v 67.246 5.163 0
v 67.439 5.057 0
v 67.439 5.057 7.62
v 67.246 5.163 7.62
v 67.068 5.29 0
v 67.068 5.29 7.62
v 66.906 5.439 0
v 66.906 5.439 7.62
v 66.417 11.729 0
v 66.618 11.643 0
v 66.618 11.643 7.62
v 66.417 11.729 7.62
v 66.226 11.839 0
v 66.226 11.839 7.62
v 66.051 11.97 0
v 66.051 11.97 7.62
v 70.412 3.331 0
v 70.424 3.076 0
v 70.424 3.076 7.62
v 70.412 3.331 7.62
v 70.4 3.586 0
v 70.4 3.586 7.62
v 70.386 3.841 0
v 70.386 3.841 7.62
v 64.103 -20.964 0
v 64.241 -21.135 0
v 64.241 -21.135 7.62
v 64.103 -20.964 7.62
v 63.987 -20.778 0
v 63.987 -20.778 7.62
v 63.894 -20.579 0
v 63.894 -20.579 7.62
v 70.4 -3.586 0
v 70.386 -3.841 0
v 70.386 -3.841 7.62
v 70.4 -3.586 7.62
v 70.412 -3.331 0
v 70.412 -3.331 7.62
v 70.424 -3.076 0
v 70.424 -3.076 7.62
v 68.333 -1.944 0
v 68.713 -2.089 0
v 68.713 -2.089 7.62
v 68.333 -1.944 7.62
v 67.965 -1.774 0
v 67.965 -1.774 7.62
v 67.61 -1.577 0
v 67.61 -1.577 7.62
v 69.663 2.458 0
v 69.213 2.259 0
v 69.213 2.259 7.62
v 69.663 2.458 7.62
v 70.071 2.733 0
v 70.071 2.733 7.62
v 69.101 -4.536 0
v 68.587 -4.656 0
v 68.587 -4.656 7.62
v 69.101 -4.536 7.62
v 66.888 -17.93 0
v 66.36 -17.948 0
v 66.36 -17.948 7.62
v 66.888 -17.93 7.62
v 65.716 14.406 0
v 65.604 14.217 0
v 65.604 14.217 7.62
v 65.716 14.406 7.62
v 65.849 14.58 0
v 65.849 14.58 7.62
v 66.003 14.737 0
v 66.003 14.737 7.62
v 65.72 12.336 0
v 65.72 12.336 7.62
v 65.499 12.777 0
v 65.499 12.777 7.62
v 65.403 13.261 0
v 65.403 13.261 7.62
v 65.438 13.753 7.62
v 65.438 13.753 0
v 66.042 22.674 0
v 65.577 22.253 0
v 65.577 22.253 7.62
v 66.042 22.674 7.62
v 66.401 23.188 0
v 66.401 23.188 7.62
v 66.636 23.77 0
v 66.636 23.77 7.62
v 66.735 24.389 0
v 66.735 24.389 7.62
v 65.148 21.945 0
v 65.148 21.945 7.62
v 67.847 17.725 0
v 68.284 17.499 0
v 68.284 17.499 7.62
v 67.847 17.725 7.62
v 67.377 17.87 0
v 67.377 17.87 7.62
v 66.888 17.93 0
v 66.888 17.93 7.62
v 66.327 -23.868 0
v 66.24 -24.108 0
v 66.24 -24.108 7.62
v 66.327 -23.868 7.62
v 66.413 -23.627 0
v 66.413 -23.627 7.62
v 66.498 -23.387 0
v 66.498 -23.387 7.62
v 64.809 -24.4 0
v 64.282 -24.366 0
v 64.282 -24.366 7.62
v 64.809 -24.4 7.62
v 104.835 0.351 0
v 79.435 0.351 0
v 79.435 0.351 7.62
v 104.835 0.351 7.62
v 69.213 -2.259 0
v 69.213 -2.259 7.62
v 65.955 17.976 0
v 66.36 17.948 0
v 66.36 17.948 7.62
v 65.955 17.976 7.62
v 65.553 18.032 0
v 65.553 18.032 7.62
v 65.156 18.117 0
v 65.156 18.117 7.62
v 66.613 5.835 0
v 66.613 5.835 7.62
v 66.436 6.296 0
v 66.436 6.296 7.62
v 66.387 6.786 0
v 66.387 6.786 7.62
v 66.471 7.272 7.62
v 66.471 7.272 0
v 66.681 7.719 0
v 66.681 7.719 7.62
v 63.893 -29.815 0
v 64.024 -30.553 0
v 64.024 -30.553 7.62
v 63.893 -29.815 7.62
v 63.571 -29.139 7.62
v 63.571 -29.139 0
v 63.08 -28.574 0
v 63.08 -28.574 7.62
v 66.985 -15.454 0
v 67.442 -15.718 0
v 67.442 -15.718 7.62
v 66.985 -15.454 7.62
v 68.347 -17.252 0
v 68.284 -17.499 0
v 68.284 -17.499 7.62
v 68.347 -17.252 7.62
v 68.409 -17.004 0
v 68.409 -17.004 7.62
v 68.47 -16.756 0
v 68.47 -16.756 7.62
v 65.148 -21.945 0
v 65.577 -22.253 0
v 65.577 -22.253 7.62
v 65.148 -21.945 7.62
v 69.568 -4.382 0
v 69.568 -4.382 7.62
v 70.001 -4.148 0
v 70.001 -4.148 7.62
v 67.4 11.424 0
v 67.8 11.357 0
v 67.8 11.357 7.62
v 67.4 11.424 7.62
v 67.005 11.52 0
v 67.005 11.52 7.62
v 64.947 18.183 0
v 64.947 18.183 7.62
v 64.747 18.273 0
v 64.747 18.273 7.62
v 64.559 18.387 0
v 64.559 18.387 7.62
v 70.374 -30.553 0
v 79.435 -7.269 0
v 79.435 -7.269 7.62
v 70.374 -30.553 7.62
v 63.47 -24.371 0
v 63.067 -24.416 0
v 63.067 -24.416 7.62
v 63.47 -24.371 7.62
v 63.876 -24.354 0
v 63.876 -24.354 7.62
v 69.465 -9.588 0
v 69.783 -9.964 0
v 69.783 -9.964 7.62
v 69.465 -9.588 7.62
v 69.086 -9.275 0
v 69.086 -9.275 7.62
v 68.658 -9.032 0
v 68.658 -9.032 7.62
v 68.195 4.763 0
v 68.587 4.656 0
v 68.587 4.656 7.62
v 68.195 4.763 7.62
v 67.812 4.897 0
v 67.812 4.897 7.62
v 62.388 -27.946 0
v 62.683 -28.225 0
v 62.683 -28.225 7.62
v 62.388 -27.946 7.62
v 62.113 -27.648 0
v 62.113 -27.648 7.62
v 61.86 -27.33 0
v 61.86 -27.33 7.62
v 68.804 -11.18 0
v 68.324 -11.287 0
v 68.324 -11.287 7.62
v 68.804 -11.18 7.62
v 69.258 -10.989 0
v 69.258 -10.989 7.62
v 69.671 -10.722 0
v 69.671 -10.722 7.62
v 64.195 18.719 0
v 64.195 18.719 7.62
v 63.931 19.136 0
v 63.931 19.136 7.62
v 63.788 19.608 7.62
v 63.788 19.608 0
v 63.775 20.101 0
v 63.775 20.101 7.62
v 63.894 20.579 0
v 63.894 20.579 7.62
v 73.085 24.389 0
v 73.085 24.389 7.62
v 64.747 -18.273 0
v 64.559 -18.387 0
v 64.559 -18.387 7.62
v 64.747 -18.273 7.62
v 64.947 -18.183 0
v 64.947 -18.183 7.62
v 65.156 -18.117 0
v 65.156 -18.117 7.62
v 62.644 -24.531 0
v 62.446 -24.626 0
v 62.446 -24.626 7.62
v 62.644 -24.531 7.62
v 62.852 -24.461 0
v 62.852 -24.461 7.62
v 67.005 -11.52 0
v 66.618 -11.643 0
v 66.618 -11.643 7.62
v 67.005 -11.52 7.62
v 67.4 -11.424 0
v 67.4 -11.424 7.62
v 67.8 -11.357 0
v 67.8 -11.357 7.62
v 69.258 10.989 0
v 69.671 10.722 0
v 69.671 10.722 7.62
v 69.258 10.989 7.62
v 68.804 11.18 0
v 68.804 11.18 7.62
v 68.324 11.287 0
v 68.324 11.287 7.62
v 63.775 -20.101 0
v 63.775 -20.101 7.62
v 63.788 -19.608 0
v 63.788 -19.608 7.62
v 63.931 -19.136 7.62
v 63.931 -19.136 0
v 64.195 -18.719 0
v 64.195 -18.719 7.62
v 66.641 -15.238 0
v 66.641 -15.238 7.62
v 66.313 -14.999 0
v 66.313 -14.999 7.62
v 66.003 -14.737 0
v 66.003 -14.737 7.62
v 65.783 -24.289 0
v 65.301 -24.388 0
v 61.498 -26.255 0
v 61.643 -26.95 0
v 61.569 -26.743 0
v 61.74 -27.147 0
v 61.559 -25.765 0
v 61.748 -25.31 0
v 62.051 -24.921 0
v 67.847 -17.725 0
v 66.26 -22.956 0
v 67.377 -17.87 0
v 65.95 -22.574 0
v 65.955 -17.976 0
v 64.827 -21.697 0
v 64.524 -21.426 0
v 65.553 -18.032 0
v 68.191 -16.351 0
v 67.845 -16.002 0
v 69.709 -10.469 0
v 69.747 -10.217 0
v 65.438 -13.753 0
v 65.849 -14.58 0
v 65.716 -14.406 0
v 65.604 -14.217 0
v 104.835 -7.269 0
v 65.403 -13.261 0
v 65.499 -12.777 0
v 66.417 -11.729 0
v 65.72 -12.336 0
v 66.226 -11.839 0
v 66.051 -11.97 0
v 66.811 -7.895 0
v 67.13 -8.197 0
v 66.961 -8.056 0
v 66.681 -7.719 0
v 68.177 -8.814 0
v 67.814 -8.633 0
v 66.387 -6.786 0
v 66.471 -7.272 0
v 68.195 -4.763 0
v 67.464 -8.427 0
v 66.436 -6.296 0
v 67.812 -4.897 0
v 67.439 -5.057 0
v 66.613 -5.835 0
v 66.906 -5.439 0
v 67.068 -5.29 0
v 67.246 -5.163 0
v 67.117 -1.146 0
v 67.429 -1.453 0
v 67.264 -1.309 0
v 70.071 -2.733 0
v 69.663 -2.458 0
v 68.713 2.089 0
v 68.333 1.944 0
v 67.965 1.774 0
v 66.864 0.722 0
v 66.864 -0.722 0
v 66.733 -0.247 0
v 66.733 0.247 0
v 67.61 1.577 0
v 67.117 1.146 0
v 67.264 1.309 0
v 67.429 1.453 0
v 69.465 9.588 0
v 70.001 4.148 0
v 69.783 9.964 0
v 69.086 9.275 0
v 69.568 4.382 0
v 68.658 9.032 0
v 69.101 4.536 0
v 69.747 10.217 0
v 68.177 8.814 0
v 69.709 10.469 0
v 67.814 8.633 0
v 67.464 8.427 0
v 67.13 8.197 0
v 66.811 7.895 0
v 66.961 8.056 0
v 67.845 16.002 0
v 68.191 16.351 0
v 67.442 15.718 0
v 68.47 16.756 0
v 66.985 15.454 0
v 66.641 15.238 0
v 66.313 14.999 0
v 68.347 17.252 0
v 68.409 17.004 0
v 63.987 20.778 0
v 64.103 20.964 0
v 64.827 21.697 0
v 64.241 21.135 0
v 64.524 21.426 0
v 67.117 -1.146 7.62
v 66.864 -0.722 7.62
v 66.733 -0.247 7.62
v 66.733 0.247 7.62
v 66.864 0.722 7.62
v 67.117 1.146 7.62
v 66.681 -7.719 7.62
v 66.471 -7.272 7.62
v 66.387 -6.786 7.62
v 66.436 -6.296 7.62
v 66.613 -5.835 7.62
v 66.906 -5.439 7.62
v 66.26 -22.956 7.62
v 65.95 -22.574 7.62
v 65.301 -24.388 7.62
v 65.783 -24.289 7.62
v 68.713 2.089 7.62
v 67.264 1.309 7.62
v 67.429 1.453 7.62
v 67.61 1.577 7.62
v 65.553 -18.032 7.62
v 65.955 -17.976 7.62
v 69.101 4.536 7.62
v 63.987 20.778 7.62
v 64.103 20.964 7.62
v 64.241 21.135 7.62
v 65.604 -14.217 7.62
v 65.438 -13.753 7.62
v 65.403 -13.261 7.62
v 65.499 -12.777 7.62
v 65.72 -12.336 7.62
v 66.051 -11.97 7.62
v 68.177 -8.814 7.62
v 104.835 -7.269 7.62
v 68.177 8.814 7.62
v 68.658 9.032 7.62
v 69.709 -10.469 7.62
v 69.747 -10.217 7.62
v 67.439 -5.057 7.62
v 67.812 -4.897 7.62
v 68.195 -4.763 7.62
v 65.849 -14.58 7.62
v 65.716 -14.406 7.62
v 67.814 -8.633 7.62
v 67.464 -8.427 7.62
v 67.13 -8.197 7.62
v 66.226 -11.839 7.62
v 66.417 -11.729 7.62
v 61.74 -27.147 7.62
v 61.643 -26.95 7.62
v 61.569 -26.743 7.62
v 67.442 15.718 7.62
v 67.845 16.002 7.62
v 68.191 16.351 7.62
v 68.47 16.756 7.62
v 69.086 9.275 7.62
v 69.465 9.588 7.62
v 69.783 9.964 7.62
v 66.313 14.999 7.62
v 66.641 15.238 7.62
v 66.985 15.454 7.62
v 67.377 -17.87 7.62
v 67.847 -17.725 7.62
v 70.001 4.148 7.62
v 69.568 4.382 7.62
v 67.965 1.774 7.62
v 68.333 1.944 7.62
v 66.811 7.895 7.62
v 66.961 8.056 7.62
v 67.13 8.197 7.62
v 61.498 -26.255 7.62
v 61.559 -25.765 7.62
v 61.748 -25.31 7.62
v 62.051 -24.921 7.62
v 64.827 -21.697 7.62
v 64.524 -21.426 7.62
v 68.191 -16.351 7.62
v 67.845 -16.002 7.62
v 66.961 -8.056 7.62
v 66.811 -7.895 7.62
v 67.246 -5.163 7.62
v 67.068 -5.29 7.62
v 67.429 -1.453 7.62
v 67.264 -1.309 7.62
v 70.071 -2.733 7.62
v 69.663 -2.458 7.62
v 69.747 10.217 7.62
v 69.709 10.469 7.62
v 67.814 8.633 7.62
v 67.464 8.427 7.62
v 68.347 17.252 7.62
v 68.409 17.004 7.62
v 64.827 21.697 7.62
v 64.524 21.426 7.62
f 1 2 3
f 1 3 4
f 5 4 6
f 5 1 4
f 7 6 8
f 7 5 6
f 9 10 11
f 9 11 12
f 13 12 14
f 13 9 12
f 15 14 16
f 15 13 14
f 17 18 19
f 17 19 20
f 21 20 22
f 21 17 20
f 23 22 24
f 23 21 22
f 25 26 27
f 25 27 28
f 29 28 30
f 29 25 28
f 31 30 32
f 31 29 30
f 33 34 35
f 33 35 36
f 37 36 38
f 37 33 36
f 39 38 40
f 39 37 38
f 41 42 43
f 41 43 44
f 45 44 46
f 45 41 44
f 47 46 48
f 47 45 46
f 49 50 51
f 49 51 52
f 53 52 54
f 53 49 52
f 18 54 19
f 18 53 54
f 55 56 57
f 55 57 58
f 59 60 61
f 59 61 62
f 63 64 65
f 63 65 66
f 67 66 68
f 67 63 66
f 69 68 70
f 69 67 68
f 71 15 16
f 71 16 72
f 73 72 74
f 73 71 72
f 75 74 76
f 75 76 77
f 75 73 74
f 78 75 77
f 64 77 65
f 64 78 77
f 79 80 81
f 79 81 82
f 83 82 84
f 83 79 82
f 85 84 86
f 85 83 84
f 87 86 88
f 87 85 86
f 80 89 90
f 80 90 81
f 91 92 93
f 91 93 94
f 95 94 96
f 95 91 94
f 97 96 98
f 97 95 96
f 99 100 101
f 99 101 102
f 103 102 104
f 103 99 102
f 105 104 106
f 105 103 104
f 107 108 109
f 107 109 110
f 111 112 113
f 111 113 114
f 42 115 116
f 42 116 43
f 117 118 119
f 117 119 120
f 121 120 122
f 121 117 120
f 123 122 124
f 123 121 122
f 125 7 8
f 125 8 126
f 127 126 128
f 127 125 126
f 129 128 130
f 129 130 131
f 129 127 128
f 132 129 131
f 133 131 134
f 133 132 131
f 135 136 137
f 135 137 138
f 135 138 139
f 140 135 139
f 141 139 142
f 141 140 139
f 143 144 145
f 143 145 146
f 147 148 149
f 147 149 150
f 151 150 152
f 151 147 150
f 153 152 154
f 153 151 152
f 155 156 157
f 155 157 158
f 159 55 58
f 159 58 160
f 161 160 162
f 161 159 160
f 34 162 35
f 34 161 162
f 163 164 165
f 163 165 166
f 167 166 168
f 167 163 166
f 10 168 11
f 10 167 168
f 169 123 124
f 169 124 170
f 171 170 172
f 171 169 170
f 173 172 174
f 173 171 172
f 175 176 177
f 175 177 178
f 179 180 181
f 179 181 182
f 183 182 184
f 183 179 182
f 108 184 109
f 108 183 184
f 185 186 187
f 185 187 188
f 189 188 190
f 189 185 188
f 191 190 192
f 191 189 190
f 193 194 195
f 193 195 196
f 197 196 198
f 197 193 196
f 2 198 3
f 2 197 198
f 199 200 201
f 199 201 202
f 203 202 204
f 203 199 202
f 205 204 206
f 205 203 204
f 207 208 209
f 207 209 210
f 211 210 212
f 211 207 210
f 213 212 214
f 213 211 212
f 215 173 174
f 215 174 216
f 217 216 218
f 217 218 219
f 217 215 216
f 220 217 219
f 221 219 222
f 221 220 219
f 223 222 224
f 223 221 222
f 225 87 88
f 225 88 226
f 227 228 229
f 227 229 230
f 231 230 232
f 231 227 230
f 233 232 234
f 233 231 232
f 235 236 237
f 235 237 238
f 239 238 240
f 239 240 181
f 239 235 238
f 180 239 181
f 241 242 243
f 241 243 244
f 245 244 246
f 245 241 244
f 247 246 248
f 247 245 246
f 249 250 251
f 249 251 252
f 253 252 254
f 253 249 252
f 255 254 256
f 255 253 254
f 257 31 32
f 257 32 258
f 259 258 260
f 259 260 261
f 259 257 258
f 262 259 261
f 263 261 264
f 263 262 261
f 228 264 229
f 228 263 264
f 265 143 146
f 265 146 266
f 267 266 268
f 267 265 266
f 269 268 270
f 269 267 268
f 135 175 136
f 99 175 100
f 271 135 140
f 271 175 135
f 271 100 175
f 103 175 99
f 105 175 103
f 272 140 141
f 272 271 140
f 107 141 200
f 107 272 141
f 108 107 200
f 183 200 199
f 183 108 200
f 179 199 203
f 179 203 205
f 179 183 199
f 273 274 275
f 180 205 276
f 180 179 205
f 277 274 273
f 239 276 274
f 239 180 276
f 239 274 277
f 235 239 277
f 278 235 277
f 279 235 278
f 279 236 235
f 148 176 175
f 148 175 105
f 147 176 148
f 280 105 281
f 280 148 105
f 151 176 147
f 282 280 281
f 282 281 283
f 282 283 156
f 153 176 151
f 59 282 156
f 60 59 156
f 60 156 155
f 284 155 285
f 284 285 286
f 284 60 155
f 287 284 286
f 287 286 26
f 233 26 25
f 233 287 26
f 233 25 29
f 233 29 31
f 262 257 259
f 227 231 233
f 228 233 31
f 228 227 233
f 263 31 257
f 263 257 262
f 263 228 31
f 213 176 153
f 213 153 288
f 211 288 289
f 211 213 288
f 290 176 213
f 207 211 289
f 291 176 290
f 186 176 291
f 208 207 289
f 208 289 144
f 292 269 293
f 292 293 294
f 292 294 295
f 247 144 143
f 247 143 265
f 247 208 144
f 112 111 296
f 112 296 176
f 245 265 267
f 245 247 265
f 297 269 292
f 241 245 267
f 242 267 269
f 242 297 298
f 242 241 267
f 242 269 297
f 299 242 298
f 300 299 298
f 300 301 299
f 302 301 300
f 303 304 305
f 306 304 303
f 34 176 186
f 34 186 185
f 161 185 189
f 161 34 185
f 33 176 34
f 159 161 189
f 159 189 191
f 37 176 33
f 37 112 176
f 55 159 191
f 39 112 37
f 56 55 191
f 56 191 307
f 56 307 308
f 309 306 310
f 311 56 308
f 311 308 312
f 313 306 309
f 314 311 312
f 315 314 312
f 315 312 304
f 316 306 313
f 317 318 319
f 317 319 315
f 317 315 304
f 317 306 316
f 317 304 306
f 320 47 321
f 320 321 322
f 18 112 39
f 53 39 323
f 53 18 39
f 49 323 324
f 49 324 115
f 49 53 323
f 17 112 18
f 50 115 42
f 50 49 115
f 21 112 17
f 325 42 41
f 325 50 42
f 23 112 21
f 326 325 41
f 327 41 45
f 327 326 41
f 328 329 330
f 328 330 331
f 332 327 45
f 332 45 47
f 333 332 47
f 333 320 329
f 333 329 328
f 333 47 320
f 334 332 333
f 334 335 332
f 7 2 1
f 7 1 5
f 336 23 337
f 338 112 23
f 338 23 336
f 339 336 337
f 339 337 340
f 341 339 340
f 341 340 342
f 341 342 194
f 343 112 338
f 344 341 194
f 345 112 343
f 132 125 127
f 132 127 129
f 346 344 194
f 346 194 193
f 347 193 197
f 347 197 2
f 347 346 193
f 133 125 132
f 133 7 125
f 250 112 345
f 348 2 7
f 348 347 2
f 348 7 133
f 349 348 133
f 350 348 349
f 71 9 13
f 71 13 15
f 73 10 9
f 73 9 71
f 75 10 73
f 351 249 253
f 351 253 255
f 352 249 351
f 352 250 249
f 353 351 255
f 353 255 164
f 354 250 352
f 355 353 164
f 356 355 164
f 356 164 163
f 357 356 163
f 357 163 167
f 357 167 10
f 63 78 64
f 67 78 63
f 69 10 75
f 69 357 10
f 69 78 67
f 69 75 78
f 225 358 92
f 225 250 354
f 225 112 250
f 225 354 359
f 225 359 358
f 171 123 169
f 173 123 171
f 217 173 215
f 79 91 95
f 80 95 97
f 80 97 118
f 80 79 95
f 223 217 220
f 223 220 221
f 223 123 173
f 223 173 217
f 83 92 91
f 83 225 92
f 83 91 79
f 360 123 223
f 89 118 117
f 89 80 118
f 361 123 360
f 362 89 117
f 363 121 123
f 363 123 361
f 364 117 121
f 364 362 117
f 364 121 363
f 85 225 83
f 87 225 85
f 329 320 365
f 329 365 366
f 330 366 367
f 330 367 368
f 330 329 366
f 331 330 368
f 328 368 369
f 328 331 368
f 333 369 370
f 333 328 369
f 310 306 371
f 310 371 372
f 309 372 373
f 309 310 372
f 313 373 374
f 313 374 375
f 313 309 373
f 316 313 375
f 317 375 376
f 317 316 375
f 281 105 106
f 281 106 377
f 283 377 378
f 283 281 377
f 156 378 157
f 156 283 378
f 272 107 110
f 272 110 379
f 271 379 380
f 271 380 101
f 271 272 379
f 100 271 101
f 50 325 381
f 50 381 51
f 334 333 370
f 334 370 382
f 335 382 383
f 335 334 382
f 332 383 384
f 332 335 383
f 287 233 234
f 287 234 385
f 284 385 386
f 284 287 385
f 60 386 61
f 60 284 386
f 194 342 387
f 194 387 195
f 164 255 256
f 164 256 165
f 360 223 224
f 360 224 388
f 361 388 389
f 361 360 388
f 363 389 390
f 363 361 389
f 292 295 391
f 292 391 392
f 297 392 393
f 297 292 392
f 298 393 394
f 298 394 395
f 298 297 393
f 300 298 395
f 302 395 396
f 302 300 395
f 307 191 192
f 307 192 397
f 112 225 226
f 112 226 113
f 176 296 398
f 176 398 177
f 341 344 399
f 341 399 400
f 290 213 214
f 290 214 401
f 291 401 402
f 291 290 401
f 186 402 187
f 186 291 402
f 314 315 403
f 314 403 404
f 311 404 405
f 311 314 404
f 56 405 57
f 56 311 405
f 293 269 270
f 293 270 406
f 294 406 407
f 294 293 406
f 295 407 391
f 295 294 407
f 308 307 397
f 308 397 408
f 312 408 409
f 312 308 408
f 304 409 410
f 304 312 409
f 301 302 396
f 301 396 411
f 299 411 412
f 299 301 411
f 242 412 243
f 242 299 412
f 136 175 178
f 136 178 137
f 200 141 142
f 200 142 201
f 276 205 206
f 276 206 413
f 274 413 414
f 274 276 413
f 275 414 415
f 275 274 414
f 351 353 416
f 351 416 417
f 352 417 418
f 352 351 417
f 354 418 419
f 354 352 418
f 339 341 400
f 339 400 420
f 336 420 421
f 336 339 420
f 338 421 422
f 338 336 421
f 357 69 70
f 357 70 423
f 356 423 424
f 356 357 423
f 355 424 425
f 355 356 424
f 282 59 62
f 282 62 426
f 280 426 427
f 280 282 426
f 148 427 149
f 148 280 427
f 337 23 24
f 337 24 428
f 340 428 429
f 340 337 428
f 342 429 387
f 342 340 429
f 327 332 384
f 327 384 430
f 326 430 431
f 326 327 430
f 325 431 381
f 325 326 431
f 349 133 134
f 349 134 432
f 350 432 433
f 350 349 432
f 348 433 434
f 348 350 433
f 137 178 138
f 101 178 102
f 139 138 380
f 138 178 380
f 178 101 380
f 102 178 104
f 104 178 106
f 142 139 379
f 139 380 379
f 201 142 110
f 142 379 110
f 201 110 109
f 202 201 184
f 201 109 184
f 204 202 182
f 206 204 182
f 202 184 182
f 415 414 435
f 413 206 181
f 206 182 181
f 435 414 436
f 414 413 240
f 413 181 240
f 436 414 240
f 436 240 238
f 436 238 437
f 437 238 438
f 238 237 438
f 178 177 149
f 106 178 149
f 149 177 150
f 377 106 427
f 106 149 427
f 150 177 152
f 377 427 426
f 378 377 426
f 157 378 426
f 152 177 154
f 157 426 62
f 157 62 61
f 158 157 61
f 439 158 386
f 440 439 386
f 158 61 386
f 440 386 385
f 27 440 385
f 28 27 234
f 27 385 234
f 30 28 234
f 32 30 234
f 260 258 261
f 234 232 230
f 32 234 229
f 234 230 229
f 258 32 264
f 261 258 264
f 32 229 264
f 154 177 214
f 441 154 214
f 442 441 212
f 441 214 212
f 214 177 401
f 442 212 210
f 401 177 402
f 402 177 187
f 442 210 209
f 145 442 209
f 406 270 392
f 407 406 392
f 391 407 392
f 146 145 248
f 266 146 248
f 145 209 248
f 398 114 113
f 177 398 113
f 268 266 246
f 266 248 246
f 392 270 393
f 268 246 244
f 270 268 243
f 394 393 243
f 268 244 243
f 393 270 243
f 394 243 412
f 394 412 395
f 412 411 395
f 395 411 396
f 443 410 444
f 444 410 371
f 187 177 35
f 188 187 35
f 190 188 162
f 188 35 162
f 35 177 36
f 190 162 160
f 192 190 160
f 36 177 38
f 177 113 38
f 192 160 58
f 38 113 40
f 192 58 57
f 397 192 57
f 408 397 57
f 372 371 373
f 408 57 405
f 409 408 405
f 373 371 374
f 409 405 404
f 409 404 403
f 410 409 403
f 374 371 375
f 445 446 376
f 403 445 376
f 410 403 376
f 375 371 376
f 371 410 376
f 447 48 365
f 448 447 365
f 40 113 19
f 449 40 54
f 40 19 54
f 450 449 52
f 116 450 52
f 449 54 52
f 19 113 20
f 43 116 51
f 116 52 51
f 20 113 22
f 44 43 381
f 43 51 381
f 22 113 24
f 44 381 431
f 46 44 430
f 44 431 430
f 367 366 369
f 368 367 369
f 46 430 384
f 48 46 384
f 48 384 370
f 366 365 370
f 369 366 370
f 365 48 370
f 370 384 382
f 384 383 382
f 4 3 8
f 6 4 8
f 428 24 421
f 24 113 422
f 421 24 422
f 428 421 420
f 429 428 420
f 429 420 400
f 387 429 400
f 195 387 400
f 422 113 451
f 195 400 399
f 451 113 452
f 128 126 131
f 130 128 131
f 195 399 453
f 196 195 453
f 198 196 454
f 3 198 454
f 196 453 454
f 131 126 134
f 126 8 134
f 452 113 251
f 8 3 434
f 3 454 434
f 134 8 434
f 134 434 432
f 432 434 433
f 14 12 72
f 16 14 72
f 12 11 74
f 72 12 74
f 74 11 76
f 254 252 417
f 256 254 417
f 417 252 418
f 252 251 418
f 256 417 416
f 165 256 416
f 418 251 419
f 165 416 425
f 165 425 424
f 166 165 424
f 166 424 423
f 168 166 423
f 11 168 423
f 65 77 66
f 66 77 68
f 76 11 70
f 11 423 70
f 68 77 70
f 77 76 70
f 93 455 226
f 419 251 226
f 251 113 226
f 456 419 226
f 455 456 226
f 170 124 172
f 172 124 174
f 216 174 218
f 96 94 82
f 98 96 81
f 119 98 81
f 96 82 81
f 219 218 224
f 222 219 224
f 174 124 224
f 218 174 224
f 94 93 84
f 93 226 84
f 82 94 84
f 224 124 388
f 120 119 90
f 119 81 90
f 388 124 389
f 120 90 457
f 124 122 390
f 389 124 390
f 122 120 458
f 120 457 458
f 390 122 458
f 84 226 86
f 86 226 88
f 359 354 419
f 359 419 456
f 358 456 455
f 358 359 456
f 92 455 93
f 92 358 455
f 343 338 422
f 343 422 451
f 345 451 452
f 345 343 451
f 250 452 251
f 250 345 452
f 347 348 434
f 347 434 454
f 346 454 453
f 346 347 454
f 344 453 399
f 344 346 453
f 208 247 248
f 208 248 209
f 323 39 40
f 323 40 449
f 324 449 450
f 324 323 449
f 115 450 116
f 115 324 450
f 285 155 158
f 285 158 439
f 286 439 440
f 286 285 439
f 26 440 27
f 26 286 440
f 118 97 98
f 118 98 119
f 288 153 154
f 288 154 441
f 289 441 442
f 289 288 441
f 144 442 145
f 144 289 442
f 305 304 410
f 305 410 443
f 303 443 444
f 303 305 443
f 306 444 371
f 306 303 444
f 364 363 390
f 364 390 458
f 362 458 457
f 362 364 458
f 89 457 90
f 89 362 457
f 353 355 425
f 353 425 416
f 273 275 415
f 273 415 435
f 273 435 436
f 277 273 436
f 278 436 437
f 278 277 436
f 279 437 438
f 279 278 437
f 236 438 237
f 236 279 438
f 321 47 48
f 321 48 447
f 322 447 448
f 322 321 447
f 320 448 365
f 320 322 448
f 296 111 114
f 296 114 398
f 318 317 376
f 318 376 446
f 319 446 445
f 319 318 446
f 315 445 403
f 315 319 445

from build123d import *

# Parameters (mm, degrees)
BOSS_EXTRUDE1_DEPTH = 7.62


with BuildPart() as part:
    # Sketch1 → Boss-Extrude1 (new body)
    with BuildSketch(Plane.XY):
        with BuildLine():
            Line((73.084670889, 24.389207851), (79.434670889, 0.351172556))
            Line((79.434670889, 0.351172556), (104.834670889, 0.351172556))
            Line((104.834670889, 0.351172556), (104.834670889, -7.268827444))
            Line((104.834670889, -7.268827444), (79.434670889, -7.268827444))
            Line((79.434670889, -7.268827444), (70.374307571, -30.552841702))
            Line((70.374307571, -30.552841702), (64.024307571, -30.552841702))
            ThreePointArc((64.024307571, -30.552841702), (63.754976443, -29.466421477), (63.079810248, -28.573673602))
            Line((63.079810248, -28.573673602), (62.683021764, -28.224932994))
            ThreePointArc((62.683021764, -28.224932994), (62.247675801, -27.79943175), (61.859720198, -27.330317834))
            ThreePointArc((61.859720198, -27.330317834), (61.688197961, -27.049614145), (61.569433036, -26.742841702))
            ThreePointArc((61.569433036, -26.742841702), (61.63789275, -25.531251133), (62.446208329, -24.626118898))
            ThreePointArc((62.446208329, -24.626118898), (62.747108688, -24.493177507), (63.066880707, -24.415974562))
            ThreePointArc((63.066880707, -24.415974562), (63.672920376, -24.358586969), (64.281631273, -24.365548236))
            Line((64.281631273, -24.365548236), (64.80879995, -24.399523215))
            ThreePointArc((64.80879995, -24.399523215), (65.544016286, -24.349243284), (66.240331439, -24.107962657))
            ThreePointArc((66.240331439, -24.107962657), (66.370344576, -23.747689015), (66.498398241, -23.386714262))
            ThreePointArc((66.498398241, -23.386714262), (66.113206158, -22.758464159), (65.576773496, -22.253180941))
            Line((65.576773496, -22.253180941), (65.147713099, -21.945011687))
            ThreePointArc((65.147713099, -21.945011687), (64.672757031, -21.564230714), (64.240688336, -21.135402009))
            ThreePointArc((64.240688336, -21.135402009), (64.042478252, -20.872862103), (63.894216256, -20.579207851))
            ThreePointArc((63.894216256, -20.579207851), (63.843589674, -19.366741197), (64.55929452, -18.38673864))
            ThreePointArc((64.55929452, -18.38673864), (64.845715425, -18.224944005), (65.156380444, -18.116769674))
            ThreePointArc((65.156380444, -18.116769674), (65.753876898, -18.000256143), (66.360339009, -17.947519788))
            Line((66.360339009, -17.947519788), (66.888299355, -17.929659602))
            ThreePointArc((66.888299355, -17.929659602), (67.615047129, -17.80755798), (68.284359697, -17.499188365))
            ThreePointArc((68.284359697, -17.499188365), (68.378433792, -17.127906023), (68.470489131, -16.756118009))
            ThreePointArc((68.470489131, -16.756118009), (68.025572575, -16.168648528), (67.442196566, -15.718377982))
            Line((67.442196566, -15.718377982), (66.984996344, -15.45374792))
            ThreePointArc((66.984996344, -15.45374792), (66.475004257, -15.121354347), (66.002983527, -14.736940707))
            ThreePointArc((66.002983527, -14.736940707), (65.779994468, -14.495092989), (65.603663244, -14.21738498))
            ThreePointArc((65.603663244, -14.21738498), (65.43443793, -13.015718957), (66.050639412, -11.970284037))
            ThreePointArc((66.050639412, -11.970284037), (66.319822476, -11.781194329), (66.618388618, -11.643090391))
            ThreePointArc((66.618388618, -11.643090391), (67.20158764, -11.46857301), (67.799960404, -11.356646914))
            Line((67.799960404, -11.356646914), (68.323627873, -11.287123566))
            ThreePointArc((68.323627873, -11.287123566), (69.034908105, -11.094376158), (69.670772242, -10.721887324))
            ThreePointArc((69.670772242, -10.721887324), (69.728001312, -10.343171934), (69.783171782, -9.964151179))
            ThreePointArc((69.783171782, -9.964151179), (69.282815542, -9.423119973), (68.658114417, -9.032198451))
            Line((68.658114417, -9.032198451), (68.177177456, -8.813656114))
            ThreePointArc((68.177177456, -8.813656114), (67.637060853, -8.532851072), (67.129633907, -8.196554611))
            ThreePointArc((67.129633907, -8.196554611), (66.884013379, -7.977728206), (66.681311093, -7.718640919))
            ThreePointArc((66.681311093, -7.718640919), (66.395116777, -6.539348227), (66.90588054, -5.438549056))
            ThreePointArc((66.90588054, -5.438549056), (67.155233381, -5.223985312), (67.438825293, -5.057281783))
            ThreePointArc((67.438825293, -5.057281783), (68.002110358, -4.82644125), (68.586631118, -4.656403321))
            Line((68.586631118, -4.656403321), (69.100962504, -4.53588636))
            ThreePointArc((69.100962504, -4.53588636), (69.789925178, -4.274349429), (70.386217165, -3.841328646))
            ThreePointArc((70.386217165, -3.841328646), (70.406050062, -3.458827444), (70.42380434, -3.076224127))
            ThreePointArc((70.42380434, -3.076224127), (69.872827121, -2.586841621), (69.212817092, -2.259033911))
            Line((69.212817092, -2.259033911), (68.71277508, -2.08868398))
            ThreePointArc((68.71277508, -2.08868398), (68.147735579, -1.862171777), (67.609789215, -1.577231214))
            ThreePointArc((67.609789215, -1.577231214), (67.343902678, -1.383533539), (67.116781464, -1.145562126))
            ThreePointArc((67.116781464, -1.145562126), (66.716374355, 0), (67.116781464, 1.145562126))
            ThreePointArc((67.116781464, 1.145562126), (67.343902678, 1.383533539), (67.609789215, 1.577231214))
            ThreePointArc((67.609789215, 1.577231214), (68.147735579, 1.862171777), (68.71277508, 2.08868398))
            Line((68.71277508, 2.08868398), (69.212817092, 2.259033911))
            ThreePointArc((69.212817092, 2.259033911), (69.872827121, 2.586841621), (70.42380434, 3.076224127))
            ThreePointArc((70.42380434, 3.076224127), (70.406050062, 3.458827444), (70.386217165, 3.841328646))
            ThreePointArc((70.386217165, 3.841328646), (69.789925178, 4.274349429), (69.100962504, 4.53588636))
            Line((69.100962504, 4.53588636), (68.586631118, 4.656403321))
            ThreePointArc((68.586631118, 4.656403321), (68.002110358, 4.82644125), (67.438825293, 5.057281783))
            ThreePointArc((67.438825293, 5.057281783), (67.155233381, 5.223985312), (66.90588054, 5.438549056))
            ThreePointArc((66.90588054, 5.438549056), (66.395116777, 6.539348227), (66.681311093, 7.718640919))
            ThreePointArc((66.681311093, 7.718640919), (66.884013379, 7.977728206), (67.129633907, 8.196554611))
            ThreePointArc((67.129633907, 8.196554611), (67.637060853, 8.532851072), (68.177177456, 8.813656114))
            Line((68.177177456, 8.813656114), (68.658114417, 9.032198451))
            ThreePointArc((68.658114417, 9.032198451), (69.282815542, 9.423119973), (69.783171782, 9.964151179))
            ThreePointArc((69.783171782, 9.964151179), (69.728001312, 10.343171934), (69.670772242, 10.721887324))
            ThreePointArc((69.670772242, 10.721887324), (69.034908105, 11.094376158), (68.323627873, 11.287123566))
            Line((68.323627873, 11.287123566), (67.799960404, 11.356646914))
            ThreePointArc((67.799960404, 11.356646914), (67.20158764, 11.46857301), (66.618388618, 11.643090391))
            ThreePointArc((66.618388618, 11.643090391), (66.319822476, 11.781194329), (66.050639412, 11.970284037))
            ThreePointArc((66.050639412, 11.970284037), (65.43443793, 13.015718957), (65.603663244, 14.21738498))
            ThreePointArc((65.603663244, 14.21738498), (65.779994468, 14.495092989), (66.002983527, 14.736940707))
            ThreePointArc((66.002983527, 14.736940707), (66.475004257, 15.121354347), (66.984996344, 15.45374792))
            Line((66.984996344, 15.45374792), (67.442196566, 15.718377982))
            ThreePointArc((67.442196566, 15.718377982), (68.025572575, 16.168648528), (68.470489131, 16.756118009))
            ThreePointArc((68.470489131, 16.756118009), (68.378433792, 17.127906023), (68.284359697, 17.499188365))
            ThreePointArc((68.284359697, 17.499188365), (67.615047129, 17.80755798), (66.888299355, 17.929659602))
            Line((66.888299355, 17.929659602), (66.360339009, 17.947519788))
            ThreePointArc((66.360339009, 17.947519788), (65.753876898, 18.000256143), (65.156380444, 18.116769674))
            ThreePointArc((65.156380444, 18.116769674), (64.845715425, 18.224944005), (64.55929452, 18.38673864))
            ThreePointArc((64.55929452, 18.38673864), (63.843589674, 19.366741197), (63.894216256, 20.579207851))
            ThreePointArc((63.894216256, 20.579207851), (64.042478252, 20.872862103), (64.240688336, 21.135402009))
            ThreePointArc((64.240688336, 21.135402009), (64.672757031, 21.564230714), (65.147713099, 21.945011687))
            Line((65.147713099, 21.945011687), (65.576773496, 22.253180941))
            ThreePointArc((65.576773496, 22.253180941), (66.400832851, 23.188324819), (66.734670889, 24.389207851))
            Line((66.734670889, 24.389207851), (73.084670889, 24.389207851))
        make_face()
    extrude(amount=BOSS_EXTRUDE1_DEPTH)


solid = part.part
